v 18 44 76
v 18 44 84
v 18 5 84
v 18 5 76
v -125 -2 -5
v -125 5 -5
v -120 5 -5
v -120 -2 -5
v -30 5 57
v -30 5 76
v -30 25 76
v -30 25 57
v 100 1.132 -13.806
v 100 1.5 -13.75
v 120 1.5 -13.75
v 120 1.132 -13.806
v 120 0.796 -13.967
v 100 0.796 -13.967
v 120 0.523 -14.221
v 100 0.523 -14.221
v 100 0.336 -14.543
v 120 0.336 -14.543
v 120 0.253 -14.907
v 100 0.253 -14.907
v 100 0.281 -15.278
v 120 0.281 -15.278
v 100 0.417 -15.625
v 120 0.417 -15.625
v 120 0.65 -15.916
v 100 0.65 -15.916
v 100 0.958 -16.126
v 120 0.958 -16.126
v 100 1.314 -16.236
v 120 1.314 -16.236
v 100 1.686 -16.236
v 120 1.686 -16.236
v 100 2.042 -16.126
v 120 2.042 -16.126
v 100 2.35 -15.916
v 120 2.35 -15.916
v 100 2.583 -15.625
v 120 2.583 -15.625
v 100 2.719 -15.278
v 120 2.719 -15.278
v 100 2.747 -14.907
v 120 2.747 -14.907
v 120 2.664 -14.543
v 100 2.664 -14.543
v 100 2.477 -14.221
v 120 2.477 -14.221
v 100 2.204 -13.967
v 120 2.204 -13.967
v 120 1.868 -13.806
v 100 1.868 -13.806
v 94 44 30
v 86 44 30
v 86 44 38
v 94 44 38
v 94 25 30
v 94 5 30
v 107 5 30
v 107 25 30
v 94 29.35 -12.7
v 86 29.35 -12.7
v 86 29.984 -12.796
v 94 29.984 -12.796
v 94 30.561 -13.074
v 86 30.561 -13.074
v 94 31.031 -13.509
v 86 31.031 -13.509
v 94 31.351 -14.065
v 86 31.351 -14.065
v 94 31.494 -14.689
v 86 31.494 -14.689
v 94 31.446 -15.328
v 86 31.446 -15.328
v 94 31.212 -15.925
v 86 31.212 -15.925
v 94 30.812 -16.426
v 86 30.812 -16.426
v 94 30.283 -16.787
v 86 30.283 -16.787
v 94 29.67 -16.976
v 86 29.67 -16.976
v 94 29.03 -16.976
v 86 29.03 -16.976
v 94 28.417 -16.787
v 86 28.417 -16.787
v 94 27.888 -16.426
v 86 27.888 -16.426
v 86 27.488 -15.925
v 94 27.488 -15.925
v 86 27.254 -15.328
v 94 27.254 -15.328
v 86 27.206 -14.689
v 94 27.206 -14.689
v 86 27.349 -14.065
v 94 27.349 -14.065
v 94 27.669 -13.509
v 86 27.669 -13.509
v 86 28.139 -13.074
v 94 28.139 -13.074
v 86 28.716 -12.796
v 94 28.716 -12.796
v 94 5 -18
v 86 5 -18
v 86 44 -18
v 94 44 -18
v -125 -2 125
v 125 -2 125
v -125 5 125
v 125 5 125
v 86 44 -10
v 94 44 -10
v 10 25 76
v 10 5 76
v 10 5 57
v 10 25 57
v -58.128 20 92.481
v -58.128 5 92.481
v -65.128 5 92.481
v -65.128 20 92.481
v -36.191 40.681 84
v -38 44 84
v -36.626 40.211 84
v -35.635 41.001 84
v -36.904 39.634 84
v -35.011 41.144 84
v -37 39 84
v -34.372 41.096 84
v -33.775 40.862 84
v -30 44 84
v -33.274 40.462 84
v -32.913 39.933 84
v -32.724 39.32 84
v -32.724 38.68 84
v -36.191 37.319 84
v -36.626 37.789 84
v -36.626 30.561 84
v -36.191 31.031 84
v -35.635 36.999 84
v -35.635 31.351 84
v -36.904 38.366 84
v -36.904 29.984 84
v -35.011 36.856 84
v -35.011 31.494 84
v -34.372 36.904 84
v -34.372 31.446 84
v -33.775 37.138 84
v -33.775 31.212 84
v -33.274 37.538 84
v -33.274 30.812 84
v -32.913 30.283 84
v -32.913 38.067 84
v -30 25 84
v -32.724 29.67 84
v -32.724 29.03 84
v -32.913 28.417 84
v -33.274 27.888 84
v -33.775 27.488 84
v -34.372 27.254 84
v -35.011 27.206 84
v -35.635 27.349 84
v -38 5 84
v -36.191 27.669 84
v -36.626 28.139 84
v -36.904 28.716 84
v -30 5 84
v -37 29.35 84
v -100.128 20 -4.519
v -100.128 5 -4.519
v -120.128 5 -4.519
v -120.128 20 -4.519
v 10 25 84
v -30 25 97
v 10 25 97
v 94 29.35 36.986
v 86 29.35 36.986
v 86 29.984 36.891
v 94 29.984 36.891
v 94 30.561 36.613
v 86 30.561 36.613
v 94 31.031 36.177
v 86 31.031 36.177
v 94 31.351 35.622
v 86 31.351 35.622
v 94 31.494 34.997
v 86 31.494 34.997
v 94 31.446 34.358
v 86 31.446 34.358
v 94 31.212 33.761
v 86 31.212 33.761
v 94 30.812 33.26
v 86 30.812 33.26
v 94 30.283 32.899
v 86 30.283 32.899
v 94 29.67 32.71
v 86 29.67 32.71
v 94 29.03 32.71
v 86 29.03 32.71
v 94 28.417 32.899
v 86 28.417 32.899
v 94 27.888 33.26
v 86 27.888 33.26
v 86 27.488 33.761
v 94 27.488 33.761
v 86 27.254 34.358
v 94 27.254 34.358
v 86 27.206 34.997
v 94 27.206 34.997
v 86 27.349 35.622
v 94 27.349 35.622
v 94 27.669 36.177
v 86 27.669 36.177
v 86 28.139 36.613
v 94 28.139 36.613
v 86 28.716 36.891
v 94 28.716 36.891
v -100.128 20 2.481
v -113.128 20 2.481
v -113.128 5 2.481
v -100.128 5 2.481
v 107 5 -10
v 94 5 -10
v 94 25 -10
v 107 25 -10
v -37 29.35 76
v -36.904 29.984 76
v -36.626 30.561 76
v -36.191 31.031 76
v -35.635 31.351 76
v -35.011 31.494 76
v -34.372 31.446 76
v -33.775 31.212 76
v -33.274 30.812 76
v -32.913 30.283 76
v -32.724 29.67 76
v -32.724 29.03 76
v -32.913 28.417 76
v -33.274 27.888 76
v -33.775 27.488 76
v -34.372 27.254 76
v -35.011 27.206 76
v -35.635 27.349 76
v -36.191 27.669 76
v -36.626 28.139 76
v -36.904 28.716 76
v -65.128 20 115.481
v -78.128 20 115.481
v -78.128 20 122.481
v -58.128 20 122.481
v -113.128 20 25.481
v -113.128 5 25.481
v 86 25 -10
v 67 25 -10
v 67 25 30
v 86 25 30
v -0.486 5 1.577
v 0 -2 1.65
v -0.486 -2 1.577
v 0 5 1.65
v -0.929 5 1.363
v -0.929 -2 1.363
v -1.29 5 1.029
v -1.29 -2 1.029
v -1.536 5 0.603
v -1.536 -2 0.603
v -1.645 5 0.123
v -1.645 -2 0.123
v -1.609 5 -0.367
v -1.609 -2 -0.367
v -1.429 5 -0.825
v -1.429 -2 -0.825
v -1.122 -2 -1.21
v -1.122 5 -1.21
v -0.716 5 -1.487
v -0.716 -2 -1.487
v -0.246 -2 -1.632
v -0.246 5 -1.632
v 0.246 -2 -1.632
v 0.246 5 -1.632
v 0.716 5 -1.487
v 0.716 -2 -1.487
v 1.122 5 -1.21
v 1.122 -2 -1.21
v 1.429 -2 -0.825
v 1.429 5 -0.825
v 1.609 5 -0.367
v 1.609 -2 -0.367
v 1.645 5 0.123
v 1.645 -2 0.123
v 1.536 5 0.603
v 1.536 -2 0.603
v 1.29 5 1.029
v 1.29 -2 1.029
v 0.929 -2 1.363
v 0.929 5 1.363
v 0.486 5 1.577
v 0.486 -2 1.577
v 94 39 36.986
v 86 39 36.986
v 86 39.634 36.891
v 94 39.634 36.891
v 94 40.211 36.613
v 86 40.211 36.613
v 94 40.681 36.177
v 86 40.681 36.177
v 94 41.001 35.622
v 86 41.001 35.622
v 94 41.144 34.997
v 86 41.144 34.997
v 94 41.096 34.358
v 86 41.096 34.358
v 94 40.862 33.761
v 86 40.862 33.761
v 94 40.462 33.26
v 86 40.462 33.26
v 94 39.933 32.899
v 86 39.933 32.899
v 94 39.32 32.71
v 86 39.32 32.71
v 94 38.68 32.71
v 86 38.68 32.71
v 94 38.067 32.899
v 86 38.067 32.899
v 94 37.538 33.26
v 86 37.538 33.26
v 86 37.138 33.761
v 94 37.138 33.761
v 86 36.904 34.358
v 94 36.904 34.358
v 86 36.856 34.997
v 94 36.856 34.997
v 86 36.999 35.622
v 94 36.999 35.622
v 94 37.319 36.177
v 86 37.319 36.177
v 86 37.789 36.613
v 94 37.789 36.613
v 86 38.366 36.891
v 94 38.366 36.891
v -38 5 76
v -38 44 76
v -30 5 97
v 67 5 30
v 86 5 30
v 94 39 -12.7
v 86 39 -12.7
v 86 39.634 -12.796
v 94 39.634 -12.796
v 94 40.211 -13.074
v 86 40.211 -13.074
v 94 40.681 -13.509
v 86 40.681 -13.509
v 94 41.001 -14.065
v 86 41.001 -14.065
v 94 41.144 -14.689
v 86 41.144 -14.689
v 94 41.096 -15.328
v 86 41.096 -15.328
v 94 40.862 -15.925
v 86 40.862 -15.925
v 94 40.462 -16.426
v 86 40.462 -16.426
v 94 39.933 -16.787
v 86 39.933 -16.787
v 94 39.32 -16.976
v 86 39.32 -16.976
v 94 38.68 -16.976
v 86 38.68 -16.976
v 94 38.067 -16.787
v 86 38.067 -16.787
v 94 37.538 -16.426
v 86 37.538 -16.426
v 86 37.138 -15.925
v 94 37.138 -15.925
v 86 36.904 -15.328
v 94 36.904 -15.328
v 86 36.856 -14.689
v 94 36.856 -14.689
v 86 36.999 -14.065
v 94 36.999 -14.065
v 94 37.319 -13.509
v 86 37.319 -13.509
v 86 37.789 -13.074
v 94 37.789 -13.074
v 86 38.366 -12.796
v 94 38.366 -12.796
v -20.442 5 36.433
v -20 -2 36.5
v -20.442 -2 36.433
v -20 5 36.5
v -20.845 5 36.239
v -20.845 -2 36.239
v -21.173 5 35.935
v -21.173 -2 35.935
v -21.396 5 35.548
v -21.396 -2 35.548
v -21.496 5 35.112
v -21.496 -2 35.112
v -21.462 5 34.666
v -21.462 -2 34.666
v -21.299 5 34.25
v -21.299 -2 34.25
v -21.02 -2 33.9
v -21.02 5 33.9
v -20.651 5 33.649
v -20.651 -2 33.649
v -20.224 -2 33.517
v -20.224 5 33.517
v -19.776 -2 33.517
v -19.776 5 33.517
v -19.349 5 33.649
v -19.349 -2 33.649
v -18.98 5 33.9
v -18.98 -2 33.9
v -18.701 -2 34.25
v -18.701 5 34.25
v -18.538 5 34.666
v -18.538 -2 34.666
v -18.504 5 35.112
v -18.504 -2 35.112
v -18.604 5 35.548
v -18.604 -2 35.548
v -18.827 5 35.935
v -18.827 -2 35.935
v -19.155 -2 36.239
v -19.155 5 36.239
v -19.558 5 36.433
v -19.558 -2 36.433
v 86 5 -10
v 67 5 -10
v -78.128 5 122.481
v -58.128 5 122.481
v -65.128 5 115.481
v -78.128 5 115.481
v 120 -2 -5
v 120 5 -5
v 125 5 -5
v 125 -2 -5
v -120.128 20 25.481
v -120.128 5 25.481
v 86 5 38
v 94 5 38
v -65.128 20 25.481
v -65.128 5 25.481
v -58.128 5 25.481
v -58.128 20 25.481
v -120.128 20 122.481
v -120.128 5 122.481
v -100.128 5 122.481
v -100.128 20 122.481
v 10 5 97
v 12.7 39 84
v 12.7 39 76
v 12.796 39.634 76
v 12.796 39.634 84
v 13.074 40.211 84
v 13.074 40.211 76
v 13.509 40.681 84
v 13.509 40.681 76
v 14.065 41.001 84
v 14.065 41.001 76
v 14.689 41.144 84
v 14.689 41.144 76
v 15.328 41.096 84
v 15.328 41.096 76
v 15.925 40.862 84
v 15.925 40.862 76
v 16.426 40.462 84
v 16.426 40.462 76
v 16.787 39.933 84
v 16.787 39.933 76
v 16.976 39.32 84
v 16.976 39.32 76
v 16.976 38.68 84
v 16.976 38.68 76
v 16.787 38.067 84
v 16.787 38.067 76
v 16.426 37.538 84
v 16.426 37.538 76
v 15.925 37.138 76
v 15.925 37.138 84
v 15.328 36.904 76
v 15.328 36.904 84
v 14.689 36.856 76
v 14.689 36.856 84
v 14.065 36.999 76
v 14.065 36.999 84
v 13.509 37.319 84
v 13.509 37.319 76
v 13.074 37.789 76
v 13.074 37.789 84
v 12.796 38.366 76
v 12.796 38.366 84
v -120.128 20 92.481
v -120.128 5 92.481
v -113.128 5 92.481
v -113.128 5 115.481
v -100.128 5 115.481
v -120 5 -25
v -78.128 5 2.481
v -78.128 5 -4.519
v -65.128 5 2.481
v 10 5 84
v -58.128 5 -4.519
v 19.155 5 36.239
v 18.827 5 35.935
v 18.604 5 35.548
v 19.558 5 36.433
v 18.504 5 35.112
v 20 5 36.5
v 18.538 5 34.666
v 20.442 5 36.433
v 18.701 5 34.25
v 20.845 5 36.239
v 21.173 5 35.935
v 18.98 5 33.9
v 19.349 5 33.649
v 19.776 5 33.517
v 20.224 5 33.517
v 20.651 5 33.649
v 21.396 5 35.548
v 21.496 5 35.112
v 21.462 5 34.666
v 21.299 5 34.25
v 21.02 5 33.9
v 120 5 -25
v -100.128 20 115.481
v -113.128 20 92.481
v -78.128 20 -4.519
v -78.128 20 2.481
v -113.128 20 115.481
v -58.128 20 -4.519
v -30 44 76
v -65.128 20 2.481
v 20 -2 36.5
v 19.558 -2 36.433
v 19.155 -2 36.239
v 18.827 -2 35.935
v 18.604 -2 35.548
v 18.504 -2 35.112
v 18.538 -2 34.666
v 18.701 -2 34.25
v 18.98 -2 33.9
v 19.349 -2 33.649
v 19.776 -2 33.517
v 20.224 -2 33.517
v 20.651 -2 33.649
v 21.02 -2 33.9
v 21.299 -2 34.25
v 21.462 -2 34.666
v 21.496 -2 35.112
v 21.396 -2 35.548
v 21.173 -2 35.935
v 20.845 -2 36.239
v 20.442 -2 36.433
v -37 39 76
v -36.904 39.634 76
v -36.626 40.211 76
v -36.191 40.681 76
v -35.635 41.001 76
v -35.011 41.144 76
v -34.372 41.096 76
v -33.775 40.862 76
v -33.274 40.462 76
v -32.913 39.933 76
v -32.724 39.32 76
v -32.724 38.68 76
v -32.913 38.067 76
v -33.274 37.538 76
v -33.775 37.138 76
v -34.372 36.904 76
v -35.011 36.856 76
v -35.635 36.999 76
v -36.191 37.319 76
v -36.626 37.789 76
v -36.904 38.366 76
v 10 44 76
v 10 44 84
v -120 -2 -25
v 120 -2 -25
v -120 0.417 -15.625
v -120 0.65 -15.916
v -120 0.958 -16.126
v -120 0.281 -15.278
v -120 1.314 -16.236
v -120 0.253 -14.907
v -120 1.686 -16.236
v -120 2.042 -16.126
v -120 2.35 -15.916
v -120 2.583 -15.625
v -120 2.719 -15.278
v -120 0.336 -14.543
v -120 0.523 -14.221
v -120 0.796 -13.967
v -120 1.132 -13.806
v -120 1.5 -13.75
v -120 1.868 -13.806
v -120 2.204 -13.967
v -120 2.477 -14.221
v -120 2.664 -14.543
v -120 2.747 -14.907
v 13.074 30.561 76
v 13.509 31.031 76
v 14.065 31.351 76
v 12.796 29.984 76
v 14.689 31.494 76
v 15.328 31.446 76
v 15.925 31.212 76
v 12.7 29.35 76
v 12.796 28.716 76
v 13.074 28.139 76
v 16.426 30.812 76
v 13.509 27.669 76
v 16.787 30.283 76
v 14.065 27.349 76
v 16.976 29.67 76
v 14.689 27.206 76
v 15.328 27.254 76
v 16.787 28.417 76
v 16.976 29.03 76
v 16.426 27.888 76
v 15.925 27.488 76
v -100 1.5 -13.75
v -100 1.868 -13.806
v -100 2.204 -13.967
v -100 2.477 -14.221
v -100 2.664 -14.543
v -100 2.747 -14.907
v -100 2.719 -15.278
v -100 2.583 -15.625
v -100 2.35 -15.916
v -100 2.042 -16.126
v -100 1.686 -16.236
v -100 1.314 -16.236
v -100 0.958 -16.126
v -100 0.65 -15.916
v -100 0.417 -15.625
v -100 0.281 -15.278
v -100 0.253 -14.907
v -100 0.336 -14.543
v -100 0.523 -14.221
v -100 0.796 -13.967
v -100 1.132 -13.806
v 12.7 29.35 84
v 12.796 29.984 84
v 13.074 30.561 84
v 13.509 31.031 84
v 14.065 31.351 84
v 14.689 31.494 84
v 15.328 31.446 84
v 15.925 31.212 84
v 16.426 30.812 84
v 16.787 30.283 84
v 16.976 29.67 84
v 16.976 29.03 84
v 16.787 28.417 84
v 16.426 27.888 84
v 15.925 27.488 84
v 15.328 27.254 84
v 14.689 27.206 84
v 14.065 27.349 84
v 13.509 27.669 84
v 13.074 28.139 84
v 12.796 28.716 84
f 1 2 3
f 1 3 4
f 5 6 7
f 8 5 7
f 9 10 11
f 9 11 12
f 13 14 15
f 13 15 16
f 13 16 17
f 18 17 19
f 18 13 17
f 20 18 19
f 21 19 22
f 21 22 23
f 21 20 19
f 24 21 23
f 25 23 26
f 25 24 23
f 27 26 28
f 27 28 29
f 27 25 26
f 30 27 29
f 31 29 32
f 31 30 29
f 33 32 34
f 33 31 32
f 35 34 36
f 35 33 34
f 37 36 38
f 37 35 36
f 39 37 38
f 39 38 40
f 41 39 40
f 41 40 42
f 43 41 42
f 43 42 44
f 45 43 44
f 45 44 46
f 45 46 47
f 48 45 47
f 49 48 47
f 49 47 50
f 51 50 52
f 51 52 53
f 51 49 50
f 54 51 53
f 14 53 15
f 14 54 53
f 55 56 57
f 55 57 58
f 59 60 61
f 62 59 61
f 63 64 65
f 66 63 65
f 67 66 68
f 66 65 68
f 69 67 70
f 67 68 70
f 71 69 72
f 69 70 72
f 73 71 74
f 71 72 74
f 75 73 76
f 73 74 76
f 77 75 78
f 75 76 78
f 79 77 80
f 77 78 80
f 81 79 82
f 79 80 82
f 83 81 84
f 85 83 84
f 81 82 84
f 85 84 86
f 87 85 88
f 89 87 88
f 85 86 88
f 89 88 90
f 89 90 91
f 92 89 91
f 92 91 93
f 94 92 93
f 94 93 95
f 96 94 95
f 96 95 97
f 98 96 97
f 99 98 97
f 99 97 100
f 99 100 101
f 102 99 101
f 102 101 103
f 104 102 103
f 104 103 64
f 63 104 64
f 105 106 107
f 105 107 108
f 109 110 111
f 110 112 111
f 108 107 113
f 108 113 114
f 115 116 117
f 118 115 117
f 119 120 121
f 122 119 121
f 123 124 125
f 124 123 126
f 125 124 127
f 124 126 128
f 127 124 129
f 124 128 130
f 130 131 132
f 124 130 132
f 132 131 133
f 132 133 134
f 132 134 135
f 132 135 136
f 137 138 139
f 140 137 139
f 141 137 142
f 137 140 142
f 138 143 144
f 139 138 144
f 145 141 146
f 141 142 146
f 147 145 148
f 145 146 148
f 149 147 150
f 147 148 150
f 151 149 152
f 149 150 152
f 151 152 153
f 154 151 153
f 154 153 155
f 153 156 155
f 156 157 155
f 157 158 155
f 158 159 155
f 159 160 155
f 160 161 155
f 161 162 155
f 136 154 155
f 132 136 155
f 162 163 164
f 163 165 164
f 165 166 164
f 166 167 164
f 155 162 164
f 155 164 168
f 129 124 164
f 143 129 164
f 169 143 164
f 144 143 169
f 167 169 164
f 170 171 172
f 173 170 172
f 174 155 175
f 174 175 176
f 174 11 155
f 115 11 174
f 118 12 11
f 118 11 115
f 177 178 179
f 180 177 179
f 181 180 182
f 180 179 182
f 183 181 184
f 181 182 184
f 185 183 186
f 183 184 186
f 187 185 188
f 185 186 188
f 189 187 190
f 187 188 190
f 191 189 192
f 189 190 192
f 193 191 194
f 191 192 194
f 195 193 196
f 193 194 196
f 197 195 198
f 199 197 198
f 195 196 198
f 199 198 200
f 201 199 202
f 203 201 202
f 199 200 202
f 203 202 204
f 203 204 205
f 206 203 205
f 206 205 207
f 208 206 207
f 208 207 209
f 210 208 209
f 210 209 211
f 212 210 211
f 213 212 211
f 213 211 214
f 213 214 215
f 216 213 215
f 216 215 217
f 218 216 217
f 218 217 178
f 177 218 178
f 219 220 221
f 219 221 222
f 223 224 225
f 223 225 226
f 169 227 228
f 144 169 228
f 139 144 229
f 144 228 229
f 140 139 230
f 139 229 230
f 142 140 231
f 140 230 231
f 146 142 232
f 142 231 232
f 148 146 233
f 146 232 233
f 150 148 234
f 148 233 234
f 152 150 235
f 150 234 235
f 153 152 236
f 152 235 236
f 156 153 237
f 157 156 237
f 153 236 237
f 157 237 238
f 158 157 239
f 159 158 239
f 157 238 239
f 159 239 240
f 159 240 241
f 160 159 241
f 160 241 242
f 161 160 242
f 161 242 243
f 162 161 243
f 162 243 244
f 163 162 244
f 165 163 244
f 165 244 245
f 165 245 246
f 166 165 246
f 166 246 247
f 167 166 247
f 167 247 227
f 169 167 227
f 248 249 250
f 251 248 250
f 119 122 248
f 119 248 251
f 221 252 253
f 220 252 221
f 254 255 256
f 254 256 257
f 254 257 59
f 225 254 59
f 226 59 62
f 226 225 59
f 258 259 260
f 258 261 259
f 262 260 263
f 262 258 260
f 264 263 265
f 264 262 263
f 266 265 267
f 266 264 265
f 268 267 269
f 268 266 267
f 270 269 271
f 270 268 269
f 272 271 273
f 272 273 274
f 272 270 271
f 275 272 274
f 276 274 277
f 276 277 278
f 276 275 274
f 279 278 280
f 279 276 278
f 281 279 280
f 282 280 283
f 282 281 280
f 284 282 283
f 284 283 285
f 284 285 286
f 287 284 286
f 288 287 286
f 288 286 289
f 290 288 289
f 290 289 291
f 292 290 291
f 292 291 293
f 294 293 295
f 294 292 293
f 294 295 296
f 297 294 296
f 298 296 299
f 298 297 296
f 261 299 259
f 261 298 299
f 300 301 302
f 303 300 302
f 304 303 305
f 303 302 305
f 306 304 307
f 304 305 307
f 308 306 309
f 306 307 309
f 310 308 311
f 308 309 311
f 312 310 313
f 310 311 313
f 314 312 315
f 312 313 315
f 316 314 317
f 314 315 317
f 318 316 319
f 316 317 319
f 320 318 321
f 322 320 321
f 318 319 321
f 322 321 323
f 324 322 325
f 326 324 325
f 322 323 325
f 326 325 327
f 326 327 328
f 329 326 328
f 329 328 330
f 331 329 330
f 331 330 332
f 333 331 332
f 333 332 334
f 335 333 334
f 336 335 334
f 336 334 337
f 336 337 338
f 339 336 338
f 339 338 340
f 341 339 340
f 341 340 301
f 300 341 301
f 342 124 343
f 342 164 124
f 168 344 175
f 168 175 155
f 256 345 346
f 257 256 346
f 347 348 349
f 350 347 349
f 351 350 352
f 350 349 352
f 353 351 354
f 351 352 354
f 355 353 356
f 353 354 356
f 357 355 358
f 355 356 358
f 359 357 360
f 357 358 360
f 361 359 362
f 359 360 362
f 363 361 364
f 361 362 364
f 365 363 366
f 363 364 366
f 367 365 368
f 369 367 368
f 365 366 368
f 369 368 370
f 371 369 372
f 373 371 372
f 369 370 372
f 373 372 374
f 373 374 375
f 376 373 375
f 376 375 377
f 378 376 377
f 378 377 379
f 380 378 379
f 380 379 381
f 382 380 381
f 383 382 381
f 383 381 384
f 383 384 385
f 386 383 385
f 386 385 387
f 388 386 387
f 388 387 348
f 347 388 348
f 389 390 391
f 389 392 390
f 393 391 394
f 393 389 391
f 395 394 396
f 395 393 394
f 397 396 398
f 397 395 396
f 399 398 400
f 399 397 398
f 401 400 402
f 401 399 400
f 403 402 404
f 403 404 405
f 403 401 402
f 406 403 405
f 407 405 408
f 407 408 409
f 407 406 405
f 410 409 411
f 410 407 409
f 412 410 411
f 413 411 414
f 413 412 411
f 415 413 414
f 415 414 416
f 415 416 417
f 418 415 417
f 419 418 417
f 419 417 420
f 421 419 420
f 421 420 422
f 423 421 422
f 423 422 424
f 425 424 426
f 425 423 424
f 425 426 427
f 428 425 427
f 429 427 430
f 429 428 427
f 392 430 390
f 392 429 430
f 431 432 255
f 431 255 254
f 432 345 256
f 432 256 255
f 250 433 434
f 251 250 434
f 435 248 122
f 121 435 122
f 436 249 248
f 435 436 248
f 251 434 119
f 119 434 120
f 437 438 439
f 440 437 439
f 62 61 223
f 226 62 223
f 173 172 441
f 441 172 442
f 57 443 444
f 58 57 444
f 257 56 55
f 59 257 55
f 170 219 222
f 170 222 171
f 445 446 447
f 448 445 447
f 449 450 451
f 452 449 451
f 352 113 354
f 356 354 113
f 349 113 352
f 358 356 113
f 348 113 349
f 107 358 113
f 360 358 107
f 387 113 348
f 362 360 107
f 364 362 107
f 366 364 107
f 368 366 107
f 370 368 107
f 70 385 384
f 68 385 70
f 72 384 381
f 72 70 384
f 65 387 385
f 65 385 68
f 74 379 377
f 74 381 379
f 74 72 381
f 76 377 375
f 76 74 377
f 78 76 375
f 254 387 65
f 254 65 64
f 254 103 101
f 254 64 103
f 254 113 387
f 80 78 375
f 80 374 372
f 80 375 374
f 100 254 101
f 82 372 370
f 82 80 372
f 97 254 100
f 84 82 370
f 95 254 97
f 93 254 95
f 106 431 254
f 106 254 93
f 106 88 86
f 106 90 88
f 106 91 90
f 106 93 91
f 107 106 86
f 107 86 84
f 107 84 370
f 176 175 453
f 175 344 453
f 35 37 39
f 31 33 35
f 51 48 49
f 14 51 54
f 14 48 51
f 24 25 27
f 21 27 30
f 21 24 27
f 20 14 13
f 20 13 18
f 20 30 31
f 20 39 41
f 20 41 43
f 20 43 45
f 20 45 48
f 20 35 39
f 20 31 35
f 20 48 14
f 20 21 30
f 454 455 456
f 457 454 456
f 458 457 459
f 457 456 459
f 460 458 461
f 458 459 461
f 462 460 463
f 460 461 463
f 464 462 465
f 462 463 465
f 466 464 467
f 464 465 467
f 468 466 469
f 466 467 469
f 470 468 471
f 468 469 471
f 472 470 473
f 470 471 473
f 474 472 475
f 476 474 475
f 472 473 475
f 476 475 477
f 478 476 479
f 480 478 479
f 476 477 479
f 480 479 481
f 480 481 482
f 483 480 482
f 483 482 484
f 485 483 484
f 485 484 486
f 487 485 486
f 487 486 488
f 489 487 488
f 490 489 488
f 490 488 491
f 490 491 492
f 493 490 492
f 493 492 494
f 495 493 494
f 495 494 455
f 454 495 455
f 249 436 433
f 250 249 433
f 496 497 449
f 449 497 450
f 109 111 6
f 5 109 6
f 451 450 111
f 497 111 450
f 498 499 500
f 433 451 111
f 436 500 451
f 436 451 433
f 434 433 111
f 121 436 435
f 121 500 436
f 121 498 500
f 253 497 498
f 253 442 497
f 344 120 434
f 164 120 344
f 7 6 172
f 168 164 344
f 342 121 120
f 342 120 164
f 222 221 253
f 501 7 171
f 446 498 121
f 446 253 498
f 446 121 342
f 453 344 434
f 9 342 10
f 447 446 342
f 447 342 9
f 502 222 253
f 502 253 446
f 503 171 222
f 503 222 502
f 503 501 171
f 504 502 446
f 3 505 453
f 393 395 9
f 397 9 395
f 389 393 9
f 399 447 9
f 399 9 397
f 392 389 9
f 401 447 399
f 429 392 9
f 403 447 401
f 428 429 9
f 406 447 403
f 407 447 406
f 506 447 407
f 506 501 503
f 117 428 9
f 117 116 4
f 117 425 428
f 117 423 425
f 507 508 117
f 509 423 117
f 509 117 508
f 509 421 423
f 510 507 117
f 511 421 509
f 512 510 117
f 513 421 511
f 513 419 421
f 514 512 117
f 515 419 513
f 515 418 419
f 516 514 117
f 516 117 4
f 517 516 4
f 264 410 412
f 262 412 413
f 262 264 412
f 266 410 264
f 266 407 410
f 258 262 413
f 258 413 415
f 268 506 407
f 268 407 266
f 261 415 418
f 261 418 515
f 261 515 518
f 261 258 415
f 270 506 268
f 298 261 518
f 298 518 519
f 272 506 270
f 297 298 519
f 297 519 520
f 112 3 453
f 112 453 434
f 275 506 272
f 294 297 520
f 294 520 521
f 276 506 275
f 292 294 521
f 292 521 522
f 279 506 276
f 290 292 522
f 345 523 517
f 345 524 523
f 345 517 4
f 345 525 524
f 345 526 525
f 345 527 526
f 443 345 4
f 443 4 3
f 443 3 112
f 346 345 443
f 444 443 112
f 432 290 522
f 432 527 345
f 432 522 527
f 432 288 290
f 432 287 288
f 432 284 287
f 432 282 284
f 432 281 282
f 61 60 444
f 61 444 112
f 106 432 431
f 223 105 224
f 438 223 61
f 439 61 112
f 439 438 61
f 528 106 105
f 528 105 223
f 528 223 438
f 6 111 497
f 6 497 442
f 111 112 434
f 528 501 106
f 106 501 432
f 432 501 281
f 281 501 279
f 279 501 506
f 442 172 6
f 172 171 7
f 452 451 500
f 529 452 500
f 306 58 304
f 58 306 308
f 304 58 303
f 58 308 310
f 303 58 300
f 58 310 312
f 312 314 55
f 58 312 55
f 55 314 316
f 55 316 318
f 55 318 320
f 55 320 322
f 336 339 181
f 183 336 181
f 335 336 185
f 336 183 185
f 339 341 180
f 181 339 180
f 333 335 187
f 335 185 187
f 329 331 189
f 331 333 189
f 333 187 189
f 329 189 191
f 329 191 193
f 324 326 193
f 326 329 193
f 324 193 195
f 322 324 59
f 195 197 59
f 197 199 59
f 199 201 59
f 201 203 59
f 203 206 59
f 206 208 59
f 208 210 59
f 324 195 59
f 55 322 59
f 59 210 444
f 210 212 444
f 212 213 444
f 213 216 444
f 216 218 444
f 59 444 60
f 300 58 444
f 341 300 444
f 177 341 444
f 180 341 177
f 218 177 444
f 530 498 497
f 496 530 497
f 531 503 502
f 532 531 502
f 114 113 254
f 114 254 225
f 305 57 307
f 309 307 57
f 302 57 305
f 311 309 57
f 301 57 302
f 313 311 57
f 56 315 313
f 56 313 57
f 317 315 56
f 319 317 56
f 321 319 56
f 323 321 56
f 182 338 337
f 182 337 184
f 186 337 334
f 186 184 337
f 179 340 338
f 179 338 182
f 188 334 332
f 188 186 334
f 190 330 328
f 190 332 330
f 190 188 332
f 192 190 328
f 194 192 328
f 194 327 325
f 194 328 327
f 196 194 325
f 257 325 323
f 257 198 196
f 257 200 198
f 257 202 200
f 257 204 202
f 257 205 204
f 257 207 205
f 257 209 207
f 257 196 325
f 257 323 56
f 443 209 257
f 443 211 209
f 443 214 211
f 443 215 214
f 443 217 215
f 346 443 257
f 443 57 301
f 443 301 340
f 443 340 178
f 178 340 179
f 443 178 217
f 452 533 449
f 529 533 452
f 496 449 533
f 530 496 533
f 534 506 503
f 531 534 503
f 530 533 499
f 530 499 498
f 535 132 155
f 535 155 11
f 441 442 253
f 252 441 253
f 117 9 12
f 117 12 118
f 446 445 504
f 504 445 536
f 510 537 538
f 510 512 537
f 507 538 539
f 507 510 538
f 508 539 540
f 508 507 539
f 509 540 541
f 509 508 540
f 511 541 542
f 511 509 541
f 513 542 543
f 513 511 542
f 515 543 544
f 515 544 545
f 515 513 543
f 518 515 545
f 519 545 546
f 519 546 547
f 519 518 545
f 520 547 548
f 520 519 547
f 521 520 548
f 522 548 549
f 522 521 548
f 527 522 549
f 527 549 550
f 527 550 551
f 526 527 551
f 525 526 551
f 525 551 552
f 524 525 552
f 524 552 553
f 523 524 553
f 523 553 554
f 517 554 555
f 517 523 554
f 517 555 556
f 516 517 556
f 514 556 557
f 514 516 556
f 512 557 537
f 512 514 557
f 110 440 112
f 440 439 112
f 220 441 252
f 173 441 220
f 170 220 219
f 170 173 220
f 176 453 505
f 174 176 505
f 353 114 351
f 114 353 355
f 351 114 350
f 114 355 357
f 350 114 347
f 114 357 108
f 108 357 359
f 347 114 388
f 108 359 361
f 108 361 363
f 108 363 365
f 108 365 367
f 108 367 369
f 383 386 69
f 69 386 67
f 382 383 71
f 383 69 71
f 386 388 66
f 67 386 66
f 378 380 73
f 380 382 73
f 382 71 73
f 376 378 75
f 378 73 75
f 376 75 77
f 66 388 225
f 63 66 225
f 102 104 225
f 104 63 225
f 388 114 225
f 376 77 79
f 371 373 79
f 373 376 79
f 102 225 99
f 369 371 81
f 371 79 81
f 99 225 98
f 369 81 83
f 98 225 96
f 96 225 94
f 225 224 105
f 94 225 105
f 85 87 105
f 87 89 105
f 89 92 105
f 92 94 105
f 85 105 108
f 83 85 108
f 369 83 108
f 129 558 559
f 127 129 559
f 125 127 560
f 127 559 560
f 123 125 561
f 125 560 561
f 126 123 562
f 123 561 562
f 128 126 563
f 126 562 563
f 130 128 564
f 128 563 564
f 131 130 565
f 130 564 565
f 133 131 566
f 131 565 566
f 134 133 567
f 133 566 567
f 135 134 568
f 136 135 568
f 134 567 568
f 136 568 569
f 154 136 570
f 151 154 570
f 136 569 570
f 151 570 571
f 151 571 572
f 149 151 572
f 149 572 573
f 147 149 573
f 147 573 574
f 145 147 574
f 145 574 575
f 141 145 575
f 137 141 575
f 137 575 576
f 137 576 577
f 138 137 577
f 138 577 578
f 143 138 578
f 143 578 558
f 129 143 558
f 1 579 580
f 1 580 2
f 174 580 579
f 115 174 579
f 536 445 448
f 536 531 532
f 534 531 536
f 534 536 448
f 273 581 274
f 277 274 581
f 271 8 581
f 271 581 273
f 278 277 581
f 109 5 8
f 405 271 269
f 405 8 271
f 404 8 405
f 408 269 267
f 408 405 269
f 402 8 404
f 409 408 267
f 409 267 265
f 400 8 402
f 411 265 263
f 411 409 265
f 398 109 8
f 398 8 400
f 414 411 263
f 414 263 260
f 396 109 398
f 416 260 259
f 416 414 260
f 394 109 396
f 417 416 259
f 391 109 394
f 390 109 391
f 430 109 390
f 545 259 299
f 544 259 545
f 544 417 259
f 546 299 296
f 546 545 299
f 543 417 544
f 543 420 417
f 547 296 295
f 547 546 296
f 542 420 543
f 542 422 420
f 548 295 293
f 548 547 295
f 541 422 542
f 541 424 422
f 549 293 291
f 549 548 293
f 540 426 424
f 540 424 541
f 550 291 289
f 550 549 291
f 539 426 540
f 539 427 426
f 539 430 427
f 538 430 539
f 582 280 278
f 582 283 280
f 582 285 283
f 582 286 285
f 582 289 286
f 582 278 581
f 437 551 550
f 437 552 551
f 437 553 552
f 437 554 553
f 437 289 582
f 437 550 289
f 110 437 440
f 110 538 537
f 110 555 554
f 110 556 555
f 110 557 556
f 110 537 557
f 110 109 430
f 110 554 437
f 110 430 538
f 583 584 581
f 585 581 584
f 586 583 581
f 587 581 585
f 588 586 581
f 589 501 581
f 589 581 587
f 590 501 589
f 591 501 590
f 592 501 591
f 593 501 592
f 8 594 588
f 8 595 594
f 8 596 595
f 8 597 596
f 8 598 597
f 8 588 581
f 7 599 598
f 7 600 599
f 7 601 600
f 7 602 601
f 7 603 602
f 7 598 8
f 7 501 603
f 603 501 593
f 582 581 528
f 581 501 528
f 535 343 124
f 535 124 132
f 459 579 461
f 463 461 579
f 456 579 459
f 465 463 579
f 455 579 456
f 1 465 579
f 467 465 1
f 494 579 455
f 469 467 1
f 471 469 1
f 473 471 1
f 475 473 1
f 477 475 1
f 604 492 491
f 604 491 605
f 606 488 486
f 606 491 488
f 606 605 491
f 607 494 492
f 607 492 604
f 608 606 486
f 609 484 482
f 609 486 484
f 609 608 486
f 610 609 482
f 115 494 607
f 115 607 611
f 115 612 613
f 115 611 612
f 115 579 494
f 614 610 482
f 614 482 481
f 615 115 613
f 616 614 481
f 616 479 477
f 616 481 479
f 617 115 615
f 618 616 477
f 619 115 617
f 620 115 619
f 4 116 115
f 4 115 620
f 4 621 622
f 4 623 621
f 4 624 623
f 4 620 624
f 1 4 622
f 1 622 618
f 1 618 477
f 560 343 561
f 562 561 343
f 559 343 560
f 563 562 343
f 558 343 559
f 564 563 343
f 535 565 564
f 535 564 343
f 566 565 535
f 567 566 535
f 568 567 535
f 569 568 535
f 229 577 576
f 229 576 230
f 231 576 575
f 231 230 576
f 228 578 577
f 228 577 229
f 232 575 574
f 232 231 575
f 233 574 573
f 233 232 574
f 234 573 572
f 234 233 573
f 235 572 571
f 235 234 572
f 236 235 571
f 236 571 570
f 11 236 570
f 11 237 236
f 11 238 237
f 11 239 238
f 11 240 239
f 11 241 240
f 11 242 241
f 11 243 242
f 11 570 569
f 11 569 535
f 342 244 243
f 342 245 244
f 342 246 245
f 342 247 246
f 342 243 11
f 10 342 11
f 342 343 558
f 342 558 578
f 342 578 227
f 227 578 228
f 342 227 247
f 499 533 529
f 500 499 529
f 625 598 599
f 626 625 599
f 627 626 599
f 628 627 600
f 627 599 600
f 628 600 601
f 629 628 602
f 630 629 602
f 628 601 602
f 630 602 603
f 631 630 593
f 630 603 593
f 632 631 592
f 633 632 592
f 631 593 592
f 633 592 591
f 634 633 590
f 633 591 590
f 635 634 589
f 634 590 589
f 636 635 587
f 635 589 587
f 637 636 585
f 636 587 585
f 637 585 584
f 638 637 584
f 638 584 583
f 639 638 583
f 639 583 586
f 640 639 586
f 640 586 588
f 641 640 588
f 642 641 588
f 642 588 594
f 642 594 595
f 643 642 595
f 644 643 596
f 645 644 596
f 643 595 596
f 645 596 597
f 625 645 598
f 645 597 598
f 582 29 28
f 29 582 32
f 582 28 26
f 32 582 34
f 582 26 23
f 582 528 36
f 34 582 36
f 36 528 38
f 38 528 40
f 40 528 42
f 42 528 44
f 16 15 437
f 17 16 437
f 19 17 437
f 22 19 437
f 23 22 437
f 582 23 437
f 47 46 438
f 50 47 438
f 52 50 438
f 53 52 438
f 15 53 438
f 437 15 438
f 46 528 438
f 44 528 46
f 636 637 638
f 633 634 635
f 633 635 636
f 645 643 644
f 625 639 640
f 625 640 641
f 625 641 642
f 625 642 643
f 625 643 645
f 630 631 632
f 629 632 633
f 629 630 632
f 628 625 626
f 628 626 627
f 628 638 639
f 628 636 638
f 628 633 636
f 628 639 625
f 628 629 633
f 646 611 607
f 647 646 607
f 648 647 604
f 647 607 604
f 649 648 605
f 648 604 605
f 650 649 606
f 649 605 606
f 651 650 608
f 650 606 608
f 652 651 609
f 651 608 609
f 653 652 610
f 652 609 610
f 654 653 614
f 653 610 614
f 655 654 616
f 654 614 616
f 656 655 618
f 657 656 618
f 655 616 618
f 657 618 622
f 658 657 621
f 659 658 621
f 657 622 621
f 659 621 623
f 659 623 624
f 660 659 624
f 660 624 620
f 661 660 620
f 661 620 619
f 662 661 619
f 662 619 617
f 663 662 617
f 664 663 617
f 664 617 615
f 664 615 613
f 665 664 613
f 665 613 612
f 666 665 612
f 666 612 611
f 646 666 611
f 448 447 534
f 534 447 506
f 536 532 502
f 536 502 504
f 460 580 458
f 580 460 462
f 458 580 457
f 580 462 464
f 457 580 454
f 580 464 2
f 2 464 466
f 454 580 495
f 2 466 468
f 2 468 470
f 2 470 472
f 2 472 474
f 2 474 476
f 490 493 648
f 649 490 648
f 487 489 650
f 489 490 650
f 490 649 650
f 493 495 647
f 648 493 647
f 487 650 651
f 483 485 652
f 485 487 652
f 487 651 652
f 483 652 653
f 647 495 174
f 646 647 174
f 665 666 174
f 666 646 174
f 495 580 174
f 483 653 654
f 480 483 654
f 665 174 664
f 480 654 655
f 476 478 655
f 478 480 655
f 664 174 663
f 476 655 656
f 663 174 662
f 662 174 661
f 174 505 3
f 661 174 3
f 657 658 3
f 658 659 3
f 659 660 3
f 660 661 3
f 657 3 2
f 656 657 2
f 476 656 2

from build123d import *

# Parameters (mm, degrees)
SKIZZE1_W                             = 250
SKIZZE1_H                             = 250
AUFSATZ_LINEAR_AUSTRAGEN1_DEPTH       = 5
SKIZZE2_W                             = 40
SKIZZE2_H                             = 40
AUFSATZ_LINEAR_AUSTRAGEN2_DEPTH       = 15
SKIZZE3_R                             = 1.65
SKIZZE3_W                             = 30
SKIZZE3_H                             = 30
SCHNITT_LINEAR_AUSTRAGEN1_DEPTH       = 15
SKIZZE4_R                             = 1.65
SKIZZE4_W                             = 30
SKIZZE4_H                             = 30
SCHNITT_LINEAR_AUSTRAGEN2_DEPTH       = 15
SKIZZE6_W                             = 40
SKIZZE6_H                             = 40
AUFSATZ_LINEAR_AUSTRAGEN3_DEPTH       = 5
SKIZZE7_W                             = 40
SKIZZE7_H                             = 40
SCHNITT_LINEAR_AUSTRAGEN3_DEPTH       = 43
SKIZZE8_W                             = 30
SKIZZE8_H                             = 30
AUFSATZ_LINEAR_AUSTRAGEN4_DEPTH       = 5
SKIZZE9_W                             = 45
SKIZZE9_H                             = 45
AUFSATZ_LINEAR_AUSTRAGEN5_DEPTH       = 15
SKIZZE10_W                            = 8
SKIZZE10_H                            = 8
AUFSATZ_LINEAR_AUSTRAGEN6_DEPTH       = 34
SKIZZE11_R                            = 2.15
SCHNITT_LINEAR_AUSTRAGEN4_DEPTH       = 34
SKIZZE12_W                            = 143.062860871
SKIZZE12_H                            = 184.486429343
SCHNITT_LINEAR_AUSTRAGEN5_DEPTH       = 60
SKIZZE13_W                            = 40
SKIZZE13_H                            = 40
AUFSATZ_LINEAR_AUSTRAGEN7_DEPTH       = 15
SKIZZE14_W                            = 8
SKIZZE14_H                            = 8
AUFSATZ_LINEAR_AUSTRAGEN8_DEPTH       = 34
SKIZZE15_W                            = 37
SKIZZE15_H                            = 14
SCHNITT_LINEAR_AUSTRAGEN6_DEPTH       = 10
SKIZZE16_W                            = 50
SKIZZE16_H                            = 70
AUFSATZ_LINEAR_AUSTRAGEN9_DEPTH       = 1
SKIZZE17_R                            = 1.35
SCHNITT_LINEAR_AUSTRAGEN7_DEPTH       = 21
SKIZZE18_R                            = 2.15
SCHNITT_LINEAR_AUSTRAGEN8_DEPTH       = 21
SKIZZE19_R                            = 2.15
SCHNITT_LINEAR_AUSTRAGEN9_DEPTH       = 21
SCHNITT_LINEAR_AUSTRAGEN10_DEPTH      = 22
SCHNITT_LINEAR_AUSTRAGEN10_DEPTH_BACK = 63
SKIZZE20_W                            = 250
SKIZZE20_H                            = 100
SKIZZE21_W                            = 5
SKIZZE21_H                            = 20
SCHNITT_LINEAR_AUSTRAGEN11_DEPTH      = 10
SKIZZE22_R                            = 1.25
SCHNITT_LINEAR_AUSTRAGEN12_DEPTH      = 20
SCHNITT_LINEAR_START                  = -20
SKIZZE23_R                            = 1.25
SCHNITT_LINEAR_AUSTRAGEN13_DEPTH      = 20
SKIZZE24_R                            = 1.5
SCHNITT_LINEAR_AUSTRAGEN15_DEPTH      = 10
SKIZZE25_W                            = 240
SKIZZE25_H                            = 20
SKIZZE25_R                            = 1.5
SKIZZE25_R_2                          = 1.65
AUFSATZ_LINEAR_AUSTRAGEN10_DEPTH      = 2
SKIZZE26_W                            = 48
SKIZZE26_H                            = 113
SCHNITT_LINEAR_AUSTRAGEN17_DEPTH      = 15
SKIZZE27_W                            = 40
SKIZZE27_H                            = 40
AUFSATZ_LINEAR_AUSTRAGEN11_DEPTH      = 4
SKIZZE28_W                            = 8
SKIZZE28_H                            = 8
AUFSATZ_LINEAR_AUSTRAGEN12_DEPTH      = 4
SKIZZE30_R                            = 2.15
SCHNITT_LINEAR_AUSTRAGEN18_DEPTH      = 9
SKIZZE31_R                            = 2.15
SCHNITT_LINEAR_AUSTRAGEN19_DEPTH      = 9
SKIZZE32_R                            = 2.15
SCHNITT_LINEAR_AUSTRAGEN20_DEPTH      = 9
SKIZZE33_W                            = 40
SKIZZE33_H                            = 40
AUFSATZ_LINEAR_AUSTRAGEN13_DEPTH      = 1
SKIZZE34_W                            = 8
SKIZZE34_H                            = 8
AUFSATZ_LINEAR_AUSTRAGEN14_DEPTH      = 1


with BuildPart() as part:
    # Skizze1 → Aufsatz-Linear austragen1 (new body)
    with BuildSketch(Plane(origin=(0, 0, 0), x_dir=(1, 0, 0), z_dir=(0, 1, 0))):
        Rectangle(SKIZZE1_W, SKIZZE1_H)
    extrude(amount=AUFSATZ_LINEAR_AUSTRAGEN1_DEPTH)

    # Skizze2 → Aufsatz-Linear austragen2 (add)
    with BuildSketch(Plane(origin=(0, 5, 0), x_dir=(1, 0, 0), z_dir=(0, 1, 0))):
        Polygon((-100.127507589, -114.480956566), (-112.127507589, -114.480956566), (-112.127507589, -92.480956566), (-120.127507589, -92.480956566), (-120.127507589, -122.480956566), (-100.127507589, -122.480956566), align=None)
        Polygon((-66.127507589, -114.480956566), (-78.127507589, -114.480956566), (-78.127507589, -122.480956566), (-58.127507589, -122.480956566), (-58.127507589, -92.480956566), (-66.127507589, -92.480956566), align=None)
        Polygon((-66.127507589, -3.480956566), (-66.127507589, -25.480956566), (-58.127507589, -25.480956566), (-58.127507589, 4.519043434), (-78.127507589, 4.519043434), (-78.127507589, -3.480956566), align=None)
        Polygon((-120.127507589, -25.480956566), (-112.127507589, -25.480956566), (-112.127507589, -3.480956566), (-100.127507589, -3.480956566), (-100.127507589, 4.519043434), (-120.127507589, 4.519043434), align=None)
        with Locations((0, -85)):
            Rectangle(SKIZZE2_W, SKIZZE2_H)
        with Locations((85, 0)):
            Rectangle(SKIZZE2_W, SKIZZE2_H)
    extrude(amount=AUFSATZ_LINEAR_AUSTRAGEN2_DEPTH)

    # Skizze3 → Schnitt-Linear austragen1 (cut)
    with BuildSketch(Plane(origin=(0, 20, 0), x_dir=(1, 0, 0), z_dir=(0, 1, 0))):
        Circle(SKIZZE3_R)
        with Locations((85, 0)):
            Rectangle(SKIZZE3_W, SKIZZE3_H)
        with Locations((0, -85)):
            Rectangle(SKIZZE3_W, SKIZZE3_H)
    extrude(amount=-SCHNITT_LINEAR_AUSTRAGEN1_DEPTH, mode=Mode.SUBTRACT)

    # Skizze4 → Schnitt-Linear austragen2 (cut)
    with BuildSketch(Plane(origin=(0, 5, 0), x_dir=(1, 0, 0), z_dir=(0, 1, 0))):
        with Locations(Location((0, 0, 0), (0, 0, 270))):
            Circle(SKIZZE4_R)
        with Locations((0, -85)):
            Rectangle(SKIZZE4_W, SKIZZE4_H)
        with Locations((85, 0)):
            Rectangle(SKIZZE4_W, SKIZZE4_H)
    extrude(amount=-SCHNITT_LINEAR_AUSTRAGEN2_DEPTH, mode=Mode.SUBTRACT)

    # Skizze6 → Aufsatz-Linear austragen3 (add)
    with BuildSketch(Plane(origin=(0, 20, 0), x_dir=(1, 0, 0), z_dir=(0, 1, 0))):
        with Locations((0, -85)):
            Rectangle(SKIZZE6_W, SKIZZE6_H)
        with Locations((85, 0)):
            Rectangle(SKIZZE6_W, SKIZZE6_H)
    extrude(amount=-AUFSATZ_LINEAR_AUSTRAGEN3_DEPTH)

    # Skizze7 → Schnitt-Linear austragen3 (cut)
    with BuildSketch(Plane(origin=(0, 5, 0), x_dir=(1, 0, 0), z_dir=(0, 1, 0))):
        with Locations((0, -85)):
            Rectangle(SKIZZE7_W, SKIZZE7_H)
        with Locations((85, 0)):
            Rectangle(SKIZZE7_W, SKIZZE7_H)
    extrude(amount=SCHNITT_LINEAR_AUSTRAGEN3_DEPTH, mode=Mode.SUBTRACT)

    # Skizze8 → Aufsatz-Linear austragen4 (add)
    with BuildSketch(Plane(origin=(0, 5, 0), x_dir=(1, 0, 0), z_dir=(0, 1, 0))):
        with Locations((0, -85)):
            Rectangle(SKIZZE8_W, SKIZZE8_H)
        with Locations((85, 0)):
            Rectangle(SKIZZE8_W, SKIZZE8_H)
    extrude(amount=-AUFSATZ_LINEAR_AUSTRAGEN4_DEPTH)

    # Skizze9 → Aufsatz-Linear austragen5 (add)
    with BuildSketch(Plane(origin=(0, 5, 0), x_dir=(1, 0, 0), z_dir=(0, 1, 0))):
        with Locations((16.5, -93.5)):
            Rectangle(SKIZZE9_W, SKIZZE9_H)
        with Locations((93.5, -16.5)):
            Rectangle(SKIZZE9_W, SKIZZE9_H)
    extrude(amount=AUFSATZ_LINEAR_AUSTRAGEN5_DEPTH)

    # Skizze10 → Aufsatz-Linear austragen6 (add)
    with BuildSketch(Plane(origin=(0, 5, 0), x_dir=(1, 0, 0), z_dir=(0, 1, 0))):
        with Locations((-10, -89)):
            Rectangle(SKIZZE10_W, SKIZZE10_H)
        with Locations((43, -89)):
            Rectangle(SKIZZE10_W, SKIZZE10_H)
        with Locations((89, 10)):
            Rectangle(SKIZZE10_W, SKIZZE10_H)
        with Locations((89, -43)):
            Rectangle(SKIZZE10_W, SKIZZE10_H)
    extrude(amount=AUFSATZ_LINEAR_AUSTRAGEN6_DEPTH)

    # Skizze11 → Schnitt-Linear austragen4 (cut)
    with BuildSketch(Plane(origin=(0, 0, 85), x_dir=(-1, 0, 0), z_dir=(0, 0, -1))):
        with Locations((10.85, 34.05)):
            Circle(SKIZZE11_R)
        with Locations((10.85, 24.35)):
            Circle(SKIZZE11_R)
        with Locations((-43.85, 34.05)):
            Circle(SKIZZE11_R)
        with Locations((-43.85, 24.35)):
            Circle(SKIZZE11_R)
    extrude(amount=-SCHNITT_LINEAR_AUSTRAGEN4_DEPTH, mode=Mode.SUBTRACT)

    # Skizze12 → Schnitt-Linear austragen5 (cut)
    with BuildSketch(Plane(origin=(0, 5, 0), x_dir=(1, 0, 0), z_dir=(0, 1, 0))):
        with Locations((48.924998025, -26.491593456)):
            Rectangle(SKIZZE12_W, SKIZZE12_H)
    extrude(amount=SCHNITT_LINEAR_AUSTRAGEN5_DEPTH, mode=Mode.SUBTRACT)

    # Skizze13 → Aufsatz-Linear austragen7 (add)
    with BuildSketch(Plane(origin=(0, 5, 0), x_dir=(1, 0, 0), z_dir=(0, 1, 0))):
        with Locations((-10, -77)):
            Rectangle(SKIZZE13_W, SKIZZE13_H)
        with Locations((87, -10)):
            Rectangle(SKIZZE13_W, SKIZZE13_H)
    extrude(amount=AUFSATZ_LINEAR_AUSTRAGEN7_DEPTH)

    # Skizze14 → Aufsatz-Linear austragen8 (add)
    with BuildSketch(Plane(origin=(0, 5, 0), x_dir=(1, 0, 0), z_dir=(0, 1, 0))):
        with Locations((-34, -80)):
            Rectangle(SKIZZE14_W, SKIZZE14_H)
        with Locations((14, -80)):
            Rectangle(SKIZZE14_W, SKIZZE14_H)
        with Locations((90, -34)):
            Rectangle(SKIZZE14_W, SKIZZE14_H)
        with Locations((90, 14)):
            Rectangle(SKIZZE14_W, SKIZZE14_H)
    extrude(amount=AUFSATZ_LINEAR_AUSTRAGEN8_DEPTH)

    # Skizze15 → Schnitt-Linear austragen6 (cut)
    with BuildSketch(Plane(origin=(0, 5, 0), x_dir=(1, 0, 0), z_dir=(0, 1, 0))):
        with Locations((0, 118)):
            Rectangle(SKIZZE15_W, SKIZZE15_H)
    extrude(amount=-SCHNITT_LINEAR_AUSTRAGEN6_DEPTH, mode=Mode.SUBTRACT)

    # Skizze16 → Aufsatz-Linear austragen9 (add)
    with BuildSketch(Plane(origin=(0, 5, 0), x_dir=(1, 0, 0), z_dir=(0, 1, 0))):
        with Locations((-76.733084372, 76.985715353)):
            Rectangle(SKIZZE16_W, SKIZZE16_H)
    extrude(amount=AUFSATZ_LINEAR_AUSTRAGEN9_DEPTH)

    # Skizze17 → Schnitt-Linear austragen7 (cut)
    with BuildSketch(Plane(origin=(0, 5, 0), x_dir=(1, 0, 0), z_dir=(0, 1, 0))):
        with Locations(Location((105.951755746, 46.286528094, 0), (0, 0, 270))):
            Circle(SKIZZE17_R)
        with Locations(Location((105.951755746, 95.286528094, 0), (0, 0, 270))):
            Circle(SKIZZE17_R)
        with Locations(Location((47.951755746, 46.286528094, 0), (0, 0, 270))):
            Circle(SKIZZE17_R)
        with Locations(Location((47.951755746, 95.286528094, 0), (0, 0, 270))):
            Circle(SKIZZE17_R)
    extrude(amount=-SCHNITT_LINEAR_AUSTRAGEN7_DEPTH, mode=Mode.SUBTRACT)

    # Skizze18 → Schnitt-Linear austragen8 (cut)
    with BuildSketch(Plane(origin=(0, 0, 76), x_dir=(-1, 0, 0), z_dir=(0, 0, -1))):
        with Locations((34.85, 39.05)):
            Circle(SKIZZE18_R)
        with Locations((34.85, 29.35)):
            Circle(SKIZZE18_R)
        with Locations((-14.85, 39.05)):
            Circle(SKIZZE18_R)
        with Locations((-14.85, 29.35)):
            Circle(SKIZZE18_R)
    extrude(amount=-SCHNITT_LINEAR_AUSTRAGEN8_DEPTH, mode=Mode.SUBTRACT)

    # Skizze19 → Schnitt-Linear austragen9 (cut)
    with BuildSketch(Plane.ZY.offset(-86)):
        with Locations((34.836277026, 39.05)):
            Circle(SKIZZE19_R)
        with Locations((34.836277026, 29.35)):
            Circle(SKIZZE19_R)
        with Locations((-14.85, 39.05)):
            Circle(SKIZZE19_R)
        with Locations((-14.85, 29.35)):
            Circle(SKIZZE19_R)
    extrude(amount=-SCHNITT_LINEAR_AUSTRAGEN9_DEPTH, mode=Mode.SUBTRACT)

    # Skizze20 → Schnitt-Linear austragen10 (cut, two sides: drawn at the far end of the back side and taken through both)
    with BuildSketch(Plane(origin=(0, 5, 0), x_dir=(1, 0, 0), z_dir=(0, 1, 0)).offset(-SCHNITT_LINEAR_AUSTRAGEN10_DEPTH_BACK)):
        with Locations((0, 75)):
            Rectangle(SKIZZE20_W, SKIZZE20_H)
    extrude(amount=SCHNITT_LINEAR_AUSTRAGEN10_DEPTH + SCHNITT_LINEAR_AUSTRAGEN10_DEPTH_BACK, mode=Mode.SUBTRACT)

    # Skizze21 → Schnitt-Linear austragen11 (cut)
    with BuildSketch(Plane(origin=(0, 5, 0), x_dir=(1, 0, 0), z_dir=(0, 1, 0))):
        with Locations((-122.5, 15)):
            Rectangle(SKIZZE21_W, SKIZZE21_H)
        with Locations((122.5, 15)):
            Rectangle(SKIZZE21_W, SKIZZE21_H)
    extrude(amount=-SCHNITT_LINEAR_AUSTRAGEN11_DEPTH, mode=Mode.SUBTRACT)

    # Skizze22 → Schnitt-Linear austragen12 (cut)
    with BuildSketch(Plane.ZY.offset(120)):
        with Locations((-15, 1.5)):
            Circle(SKIZZE22_R)
    extrude(amount=-SCHNITT_LINEAR_AUSTRAGEN12_DEPTH, mode=Mode.SUBTRACT)

    # Skizze23 → Schnitt-Linear austragen13 (cut)
    with BuildSketch(Plane(origin=(120, 0, 0), x_dir=(0, 0, -1), z_dir=(1, 0, 0)).offset(SCHNITT_LINEAR_START)):
        with Locations(Location((15, 1.5, 0), (0, 0, 180))):
            Circle(SKIZZE23_R)
    extrude(amount=SCHNITT_LINEAR_AUSTRAGEN13_DEPTH, mode=Mode.SUBTRACT)

    # Skizze24 → Schnitt-Linear austragen15 (cut)
    with BuildSketch(Plane(origin=(0, 5, 0), x_dir=(1, 0, 0), z_dir=(0, 1, 0))):
        with Locations(Location((-20, -35, 0), (0, 0, 270))):
            Circle(SKIZZE24_R)
        with Locations(Location((20, -35, 0), (0, 0, 270))):
            Circle(SKIZZE24_R)
    extrude(amount=-SCHNITT_LINEAR_AUSTRAGEN15_DEPTH, mode=Mode.SUBTRACT)

    # Skizze25 → Aufsatz-Linear austragen10 (add)
    # profile 1 of 2: a face of its own
    with BuildSketch(Plane.XZ):
        with Locations((0, -15)):
            Rectangle(SKIZZE25_W, SKIZZE25_H)
    # profile 2 of 2: a face of its own
    with BuildSketch(Plane.XZ):
        Polygon((125, -5), (125, 125), (-125, 125), (-125, -5), (-120, -5), (120, -5), align=None)
        with Locations(Location((-20, 35, 0), (0, 0, 90))):
            Circle(SKIZZE25_R, mode=Mode.SUBTRACT)
        with Locations(Location((0, 0, 0), (0, 0, 90))):
            Circle(SKIZZE25_R_2, mode=Mode.SUBTRACT)
        with Locations(Location((20, 35, 0), (0, 0, 90))):
            Circle(SKIZZE25_R, mode=Mode.SUBTRACT)
    extrude(amount=AUFSATZ_LINEAR_AUSTRAGEN10_DEPTH)

    # Skizze26 → Schnitt-Linear austragen17 (cut)
    with BuildSketch(Plane(origin=(0, 20, 0), x_dir=(1, 0, 0), z_dir=(0, 1, 0))):
        with Locations((-89.127507589, -58.980956566)):
            Rectangle(SKIZZE26_W, SKIZZE26_H)
    extrude(amount=-SCHNITT_LINEAR_AUSTRAGEN17_DEPTH, mode=Mode.SUBTRACT)

    # Skizze27 → Aufsatz-Linear austragen11 (add)
    with BuildSketch(Plane(origin=(0, 20, 0), x_dir=(1, 0, 0), z_dir=(0, 1, 0))):
        with Locations((87, -10)):
            Rectangle(SKIZZE27_W, SKIZZE27_H)
        with Locations((-10, -77)):
            Rectangle(SKIZZE27_W, SKIZZE27_H)
    extrude(amount=AUFSATZ_LINEAR_AUSTRAGEN11_DEPTH)

    # Skizze28 → Aufsatz-Linear austragen12 (add)
    with BuildSketch(Plane(origin=(0, 39, 0), x_dir=(1, 0, 0), z_dir=(0, 1, 0))):
        with Locations((14, -80)):
            Rectangle(SKIZZE28_W, SKIZZE28_H)
        with Locations((-34, -80)):
            Rectangle(SKIZZE28_W, SKIZZE28_H)
        with Locations((90, -34)):
            Rectangle(SKIZZE28_W, SKIZZE28_H)
        with Locations((90, 14)):
            Rectangle(SKIZZE28_W, SKIZZE28_H)
    extrude(amount=AUFSATZ_LINEAR_AUSTRAGEN12_DEPTH)

    # Skizze30 → Schnitt-Linear austragen18 (cut)
    with BuildSketch(Plane.ZY.offset(-86)):
        with Locations((34.836277026, 39)):
            Circle(SKIZZE30_R)
    extrude(amount=-SCHNITT_LINEAR_AUSTRAGEN18_DEPTH, mode=Mode.SUBTRACT)

    # Skizze31 → Schnitt-Linear austragen19 (cut)
    with BuildSketch(Plane.ZY.offset(-86)):
        with Locations((-14.85, 39)):
            Circle(SKIZZE31_R)
    extrude(amount=-SCHNITT_LINEAR_AUSTRAGEN19_DEPTH, mode=Mode.SUBTRACT)

    # Skizze32 → Schnitt-Linear austragen20 (cut)
    with BuildSketch(Plane(origin=(0, 0, 76), x_dir=(-1, 0, 0), z_dir=(0, 0, -1))):
        with Locations((-14.85, 39)):
            Circle(SKIZZE32_R)
        with Locations((34.85, 39)):
            Circle(SKIZZE32_R)
    extrude(amount=-SCHNITT_LINEAR_AUSTRAGEN20_DEPTH, mode=Mode.SUBTRACT)

    # Skizze33 → Aufsatz-Linear austragen13 (add)
    with BuildSketch(Plane(origin=(0, 24, 0), x_dir=(1, 0, 0), z_dir=(0, 1, 0))):
        with Locations((-10, -77)):
            Rectangle(SKIZZE33_W, SKIZZE33_H)
        with Locations((87, -10)):
            Rectangle(SKIZZE33_W, SKIZZE33_H)
    extrude(amount=AUFSATZ_LINEAR_AUSTRAGEN13_DEPTH)

    # Skizze34 → Aufsatz-Linear austragen14 (add)
    with BuildSketch(Plane(origin=(0, 43, 0), x_dir=(1, 0, 0), z_dir=(0, 1, 0))):
        with Locations((-34, -80)):
            Rectangle(SKIZZE34_W, SKIZZE34_H)
        with Locations((14, -80)):
            Rectangle(SKIZZE34_W, SKIZZE34_H)
        with Locations((90, -34)):
            Rectangle(SKIZZE34_W, SKIZZE34_H)
        with Locations((90, 14)):
            Rectangle(SKIZZE34_W, SKIZZE34_H)
    extrude(amount=AUFSATZ_LINEAR_AUSTRAGEN14_DEPTH)


solid = part.part
